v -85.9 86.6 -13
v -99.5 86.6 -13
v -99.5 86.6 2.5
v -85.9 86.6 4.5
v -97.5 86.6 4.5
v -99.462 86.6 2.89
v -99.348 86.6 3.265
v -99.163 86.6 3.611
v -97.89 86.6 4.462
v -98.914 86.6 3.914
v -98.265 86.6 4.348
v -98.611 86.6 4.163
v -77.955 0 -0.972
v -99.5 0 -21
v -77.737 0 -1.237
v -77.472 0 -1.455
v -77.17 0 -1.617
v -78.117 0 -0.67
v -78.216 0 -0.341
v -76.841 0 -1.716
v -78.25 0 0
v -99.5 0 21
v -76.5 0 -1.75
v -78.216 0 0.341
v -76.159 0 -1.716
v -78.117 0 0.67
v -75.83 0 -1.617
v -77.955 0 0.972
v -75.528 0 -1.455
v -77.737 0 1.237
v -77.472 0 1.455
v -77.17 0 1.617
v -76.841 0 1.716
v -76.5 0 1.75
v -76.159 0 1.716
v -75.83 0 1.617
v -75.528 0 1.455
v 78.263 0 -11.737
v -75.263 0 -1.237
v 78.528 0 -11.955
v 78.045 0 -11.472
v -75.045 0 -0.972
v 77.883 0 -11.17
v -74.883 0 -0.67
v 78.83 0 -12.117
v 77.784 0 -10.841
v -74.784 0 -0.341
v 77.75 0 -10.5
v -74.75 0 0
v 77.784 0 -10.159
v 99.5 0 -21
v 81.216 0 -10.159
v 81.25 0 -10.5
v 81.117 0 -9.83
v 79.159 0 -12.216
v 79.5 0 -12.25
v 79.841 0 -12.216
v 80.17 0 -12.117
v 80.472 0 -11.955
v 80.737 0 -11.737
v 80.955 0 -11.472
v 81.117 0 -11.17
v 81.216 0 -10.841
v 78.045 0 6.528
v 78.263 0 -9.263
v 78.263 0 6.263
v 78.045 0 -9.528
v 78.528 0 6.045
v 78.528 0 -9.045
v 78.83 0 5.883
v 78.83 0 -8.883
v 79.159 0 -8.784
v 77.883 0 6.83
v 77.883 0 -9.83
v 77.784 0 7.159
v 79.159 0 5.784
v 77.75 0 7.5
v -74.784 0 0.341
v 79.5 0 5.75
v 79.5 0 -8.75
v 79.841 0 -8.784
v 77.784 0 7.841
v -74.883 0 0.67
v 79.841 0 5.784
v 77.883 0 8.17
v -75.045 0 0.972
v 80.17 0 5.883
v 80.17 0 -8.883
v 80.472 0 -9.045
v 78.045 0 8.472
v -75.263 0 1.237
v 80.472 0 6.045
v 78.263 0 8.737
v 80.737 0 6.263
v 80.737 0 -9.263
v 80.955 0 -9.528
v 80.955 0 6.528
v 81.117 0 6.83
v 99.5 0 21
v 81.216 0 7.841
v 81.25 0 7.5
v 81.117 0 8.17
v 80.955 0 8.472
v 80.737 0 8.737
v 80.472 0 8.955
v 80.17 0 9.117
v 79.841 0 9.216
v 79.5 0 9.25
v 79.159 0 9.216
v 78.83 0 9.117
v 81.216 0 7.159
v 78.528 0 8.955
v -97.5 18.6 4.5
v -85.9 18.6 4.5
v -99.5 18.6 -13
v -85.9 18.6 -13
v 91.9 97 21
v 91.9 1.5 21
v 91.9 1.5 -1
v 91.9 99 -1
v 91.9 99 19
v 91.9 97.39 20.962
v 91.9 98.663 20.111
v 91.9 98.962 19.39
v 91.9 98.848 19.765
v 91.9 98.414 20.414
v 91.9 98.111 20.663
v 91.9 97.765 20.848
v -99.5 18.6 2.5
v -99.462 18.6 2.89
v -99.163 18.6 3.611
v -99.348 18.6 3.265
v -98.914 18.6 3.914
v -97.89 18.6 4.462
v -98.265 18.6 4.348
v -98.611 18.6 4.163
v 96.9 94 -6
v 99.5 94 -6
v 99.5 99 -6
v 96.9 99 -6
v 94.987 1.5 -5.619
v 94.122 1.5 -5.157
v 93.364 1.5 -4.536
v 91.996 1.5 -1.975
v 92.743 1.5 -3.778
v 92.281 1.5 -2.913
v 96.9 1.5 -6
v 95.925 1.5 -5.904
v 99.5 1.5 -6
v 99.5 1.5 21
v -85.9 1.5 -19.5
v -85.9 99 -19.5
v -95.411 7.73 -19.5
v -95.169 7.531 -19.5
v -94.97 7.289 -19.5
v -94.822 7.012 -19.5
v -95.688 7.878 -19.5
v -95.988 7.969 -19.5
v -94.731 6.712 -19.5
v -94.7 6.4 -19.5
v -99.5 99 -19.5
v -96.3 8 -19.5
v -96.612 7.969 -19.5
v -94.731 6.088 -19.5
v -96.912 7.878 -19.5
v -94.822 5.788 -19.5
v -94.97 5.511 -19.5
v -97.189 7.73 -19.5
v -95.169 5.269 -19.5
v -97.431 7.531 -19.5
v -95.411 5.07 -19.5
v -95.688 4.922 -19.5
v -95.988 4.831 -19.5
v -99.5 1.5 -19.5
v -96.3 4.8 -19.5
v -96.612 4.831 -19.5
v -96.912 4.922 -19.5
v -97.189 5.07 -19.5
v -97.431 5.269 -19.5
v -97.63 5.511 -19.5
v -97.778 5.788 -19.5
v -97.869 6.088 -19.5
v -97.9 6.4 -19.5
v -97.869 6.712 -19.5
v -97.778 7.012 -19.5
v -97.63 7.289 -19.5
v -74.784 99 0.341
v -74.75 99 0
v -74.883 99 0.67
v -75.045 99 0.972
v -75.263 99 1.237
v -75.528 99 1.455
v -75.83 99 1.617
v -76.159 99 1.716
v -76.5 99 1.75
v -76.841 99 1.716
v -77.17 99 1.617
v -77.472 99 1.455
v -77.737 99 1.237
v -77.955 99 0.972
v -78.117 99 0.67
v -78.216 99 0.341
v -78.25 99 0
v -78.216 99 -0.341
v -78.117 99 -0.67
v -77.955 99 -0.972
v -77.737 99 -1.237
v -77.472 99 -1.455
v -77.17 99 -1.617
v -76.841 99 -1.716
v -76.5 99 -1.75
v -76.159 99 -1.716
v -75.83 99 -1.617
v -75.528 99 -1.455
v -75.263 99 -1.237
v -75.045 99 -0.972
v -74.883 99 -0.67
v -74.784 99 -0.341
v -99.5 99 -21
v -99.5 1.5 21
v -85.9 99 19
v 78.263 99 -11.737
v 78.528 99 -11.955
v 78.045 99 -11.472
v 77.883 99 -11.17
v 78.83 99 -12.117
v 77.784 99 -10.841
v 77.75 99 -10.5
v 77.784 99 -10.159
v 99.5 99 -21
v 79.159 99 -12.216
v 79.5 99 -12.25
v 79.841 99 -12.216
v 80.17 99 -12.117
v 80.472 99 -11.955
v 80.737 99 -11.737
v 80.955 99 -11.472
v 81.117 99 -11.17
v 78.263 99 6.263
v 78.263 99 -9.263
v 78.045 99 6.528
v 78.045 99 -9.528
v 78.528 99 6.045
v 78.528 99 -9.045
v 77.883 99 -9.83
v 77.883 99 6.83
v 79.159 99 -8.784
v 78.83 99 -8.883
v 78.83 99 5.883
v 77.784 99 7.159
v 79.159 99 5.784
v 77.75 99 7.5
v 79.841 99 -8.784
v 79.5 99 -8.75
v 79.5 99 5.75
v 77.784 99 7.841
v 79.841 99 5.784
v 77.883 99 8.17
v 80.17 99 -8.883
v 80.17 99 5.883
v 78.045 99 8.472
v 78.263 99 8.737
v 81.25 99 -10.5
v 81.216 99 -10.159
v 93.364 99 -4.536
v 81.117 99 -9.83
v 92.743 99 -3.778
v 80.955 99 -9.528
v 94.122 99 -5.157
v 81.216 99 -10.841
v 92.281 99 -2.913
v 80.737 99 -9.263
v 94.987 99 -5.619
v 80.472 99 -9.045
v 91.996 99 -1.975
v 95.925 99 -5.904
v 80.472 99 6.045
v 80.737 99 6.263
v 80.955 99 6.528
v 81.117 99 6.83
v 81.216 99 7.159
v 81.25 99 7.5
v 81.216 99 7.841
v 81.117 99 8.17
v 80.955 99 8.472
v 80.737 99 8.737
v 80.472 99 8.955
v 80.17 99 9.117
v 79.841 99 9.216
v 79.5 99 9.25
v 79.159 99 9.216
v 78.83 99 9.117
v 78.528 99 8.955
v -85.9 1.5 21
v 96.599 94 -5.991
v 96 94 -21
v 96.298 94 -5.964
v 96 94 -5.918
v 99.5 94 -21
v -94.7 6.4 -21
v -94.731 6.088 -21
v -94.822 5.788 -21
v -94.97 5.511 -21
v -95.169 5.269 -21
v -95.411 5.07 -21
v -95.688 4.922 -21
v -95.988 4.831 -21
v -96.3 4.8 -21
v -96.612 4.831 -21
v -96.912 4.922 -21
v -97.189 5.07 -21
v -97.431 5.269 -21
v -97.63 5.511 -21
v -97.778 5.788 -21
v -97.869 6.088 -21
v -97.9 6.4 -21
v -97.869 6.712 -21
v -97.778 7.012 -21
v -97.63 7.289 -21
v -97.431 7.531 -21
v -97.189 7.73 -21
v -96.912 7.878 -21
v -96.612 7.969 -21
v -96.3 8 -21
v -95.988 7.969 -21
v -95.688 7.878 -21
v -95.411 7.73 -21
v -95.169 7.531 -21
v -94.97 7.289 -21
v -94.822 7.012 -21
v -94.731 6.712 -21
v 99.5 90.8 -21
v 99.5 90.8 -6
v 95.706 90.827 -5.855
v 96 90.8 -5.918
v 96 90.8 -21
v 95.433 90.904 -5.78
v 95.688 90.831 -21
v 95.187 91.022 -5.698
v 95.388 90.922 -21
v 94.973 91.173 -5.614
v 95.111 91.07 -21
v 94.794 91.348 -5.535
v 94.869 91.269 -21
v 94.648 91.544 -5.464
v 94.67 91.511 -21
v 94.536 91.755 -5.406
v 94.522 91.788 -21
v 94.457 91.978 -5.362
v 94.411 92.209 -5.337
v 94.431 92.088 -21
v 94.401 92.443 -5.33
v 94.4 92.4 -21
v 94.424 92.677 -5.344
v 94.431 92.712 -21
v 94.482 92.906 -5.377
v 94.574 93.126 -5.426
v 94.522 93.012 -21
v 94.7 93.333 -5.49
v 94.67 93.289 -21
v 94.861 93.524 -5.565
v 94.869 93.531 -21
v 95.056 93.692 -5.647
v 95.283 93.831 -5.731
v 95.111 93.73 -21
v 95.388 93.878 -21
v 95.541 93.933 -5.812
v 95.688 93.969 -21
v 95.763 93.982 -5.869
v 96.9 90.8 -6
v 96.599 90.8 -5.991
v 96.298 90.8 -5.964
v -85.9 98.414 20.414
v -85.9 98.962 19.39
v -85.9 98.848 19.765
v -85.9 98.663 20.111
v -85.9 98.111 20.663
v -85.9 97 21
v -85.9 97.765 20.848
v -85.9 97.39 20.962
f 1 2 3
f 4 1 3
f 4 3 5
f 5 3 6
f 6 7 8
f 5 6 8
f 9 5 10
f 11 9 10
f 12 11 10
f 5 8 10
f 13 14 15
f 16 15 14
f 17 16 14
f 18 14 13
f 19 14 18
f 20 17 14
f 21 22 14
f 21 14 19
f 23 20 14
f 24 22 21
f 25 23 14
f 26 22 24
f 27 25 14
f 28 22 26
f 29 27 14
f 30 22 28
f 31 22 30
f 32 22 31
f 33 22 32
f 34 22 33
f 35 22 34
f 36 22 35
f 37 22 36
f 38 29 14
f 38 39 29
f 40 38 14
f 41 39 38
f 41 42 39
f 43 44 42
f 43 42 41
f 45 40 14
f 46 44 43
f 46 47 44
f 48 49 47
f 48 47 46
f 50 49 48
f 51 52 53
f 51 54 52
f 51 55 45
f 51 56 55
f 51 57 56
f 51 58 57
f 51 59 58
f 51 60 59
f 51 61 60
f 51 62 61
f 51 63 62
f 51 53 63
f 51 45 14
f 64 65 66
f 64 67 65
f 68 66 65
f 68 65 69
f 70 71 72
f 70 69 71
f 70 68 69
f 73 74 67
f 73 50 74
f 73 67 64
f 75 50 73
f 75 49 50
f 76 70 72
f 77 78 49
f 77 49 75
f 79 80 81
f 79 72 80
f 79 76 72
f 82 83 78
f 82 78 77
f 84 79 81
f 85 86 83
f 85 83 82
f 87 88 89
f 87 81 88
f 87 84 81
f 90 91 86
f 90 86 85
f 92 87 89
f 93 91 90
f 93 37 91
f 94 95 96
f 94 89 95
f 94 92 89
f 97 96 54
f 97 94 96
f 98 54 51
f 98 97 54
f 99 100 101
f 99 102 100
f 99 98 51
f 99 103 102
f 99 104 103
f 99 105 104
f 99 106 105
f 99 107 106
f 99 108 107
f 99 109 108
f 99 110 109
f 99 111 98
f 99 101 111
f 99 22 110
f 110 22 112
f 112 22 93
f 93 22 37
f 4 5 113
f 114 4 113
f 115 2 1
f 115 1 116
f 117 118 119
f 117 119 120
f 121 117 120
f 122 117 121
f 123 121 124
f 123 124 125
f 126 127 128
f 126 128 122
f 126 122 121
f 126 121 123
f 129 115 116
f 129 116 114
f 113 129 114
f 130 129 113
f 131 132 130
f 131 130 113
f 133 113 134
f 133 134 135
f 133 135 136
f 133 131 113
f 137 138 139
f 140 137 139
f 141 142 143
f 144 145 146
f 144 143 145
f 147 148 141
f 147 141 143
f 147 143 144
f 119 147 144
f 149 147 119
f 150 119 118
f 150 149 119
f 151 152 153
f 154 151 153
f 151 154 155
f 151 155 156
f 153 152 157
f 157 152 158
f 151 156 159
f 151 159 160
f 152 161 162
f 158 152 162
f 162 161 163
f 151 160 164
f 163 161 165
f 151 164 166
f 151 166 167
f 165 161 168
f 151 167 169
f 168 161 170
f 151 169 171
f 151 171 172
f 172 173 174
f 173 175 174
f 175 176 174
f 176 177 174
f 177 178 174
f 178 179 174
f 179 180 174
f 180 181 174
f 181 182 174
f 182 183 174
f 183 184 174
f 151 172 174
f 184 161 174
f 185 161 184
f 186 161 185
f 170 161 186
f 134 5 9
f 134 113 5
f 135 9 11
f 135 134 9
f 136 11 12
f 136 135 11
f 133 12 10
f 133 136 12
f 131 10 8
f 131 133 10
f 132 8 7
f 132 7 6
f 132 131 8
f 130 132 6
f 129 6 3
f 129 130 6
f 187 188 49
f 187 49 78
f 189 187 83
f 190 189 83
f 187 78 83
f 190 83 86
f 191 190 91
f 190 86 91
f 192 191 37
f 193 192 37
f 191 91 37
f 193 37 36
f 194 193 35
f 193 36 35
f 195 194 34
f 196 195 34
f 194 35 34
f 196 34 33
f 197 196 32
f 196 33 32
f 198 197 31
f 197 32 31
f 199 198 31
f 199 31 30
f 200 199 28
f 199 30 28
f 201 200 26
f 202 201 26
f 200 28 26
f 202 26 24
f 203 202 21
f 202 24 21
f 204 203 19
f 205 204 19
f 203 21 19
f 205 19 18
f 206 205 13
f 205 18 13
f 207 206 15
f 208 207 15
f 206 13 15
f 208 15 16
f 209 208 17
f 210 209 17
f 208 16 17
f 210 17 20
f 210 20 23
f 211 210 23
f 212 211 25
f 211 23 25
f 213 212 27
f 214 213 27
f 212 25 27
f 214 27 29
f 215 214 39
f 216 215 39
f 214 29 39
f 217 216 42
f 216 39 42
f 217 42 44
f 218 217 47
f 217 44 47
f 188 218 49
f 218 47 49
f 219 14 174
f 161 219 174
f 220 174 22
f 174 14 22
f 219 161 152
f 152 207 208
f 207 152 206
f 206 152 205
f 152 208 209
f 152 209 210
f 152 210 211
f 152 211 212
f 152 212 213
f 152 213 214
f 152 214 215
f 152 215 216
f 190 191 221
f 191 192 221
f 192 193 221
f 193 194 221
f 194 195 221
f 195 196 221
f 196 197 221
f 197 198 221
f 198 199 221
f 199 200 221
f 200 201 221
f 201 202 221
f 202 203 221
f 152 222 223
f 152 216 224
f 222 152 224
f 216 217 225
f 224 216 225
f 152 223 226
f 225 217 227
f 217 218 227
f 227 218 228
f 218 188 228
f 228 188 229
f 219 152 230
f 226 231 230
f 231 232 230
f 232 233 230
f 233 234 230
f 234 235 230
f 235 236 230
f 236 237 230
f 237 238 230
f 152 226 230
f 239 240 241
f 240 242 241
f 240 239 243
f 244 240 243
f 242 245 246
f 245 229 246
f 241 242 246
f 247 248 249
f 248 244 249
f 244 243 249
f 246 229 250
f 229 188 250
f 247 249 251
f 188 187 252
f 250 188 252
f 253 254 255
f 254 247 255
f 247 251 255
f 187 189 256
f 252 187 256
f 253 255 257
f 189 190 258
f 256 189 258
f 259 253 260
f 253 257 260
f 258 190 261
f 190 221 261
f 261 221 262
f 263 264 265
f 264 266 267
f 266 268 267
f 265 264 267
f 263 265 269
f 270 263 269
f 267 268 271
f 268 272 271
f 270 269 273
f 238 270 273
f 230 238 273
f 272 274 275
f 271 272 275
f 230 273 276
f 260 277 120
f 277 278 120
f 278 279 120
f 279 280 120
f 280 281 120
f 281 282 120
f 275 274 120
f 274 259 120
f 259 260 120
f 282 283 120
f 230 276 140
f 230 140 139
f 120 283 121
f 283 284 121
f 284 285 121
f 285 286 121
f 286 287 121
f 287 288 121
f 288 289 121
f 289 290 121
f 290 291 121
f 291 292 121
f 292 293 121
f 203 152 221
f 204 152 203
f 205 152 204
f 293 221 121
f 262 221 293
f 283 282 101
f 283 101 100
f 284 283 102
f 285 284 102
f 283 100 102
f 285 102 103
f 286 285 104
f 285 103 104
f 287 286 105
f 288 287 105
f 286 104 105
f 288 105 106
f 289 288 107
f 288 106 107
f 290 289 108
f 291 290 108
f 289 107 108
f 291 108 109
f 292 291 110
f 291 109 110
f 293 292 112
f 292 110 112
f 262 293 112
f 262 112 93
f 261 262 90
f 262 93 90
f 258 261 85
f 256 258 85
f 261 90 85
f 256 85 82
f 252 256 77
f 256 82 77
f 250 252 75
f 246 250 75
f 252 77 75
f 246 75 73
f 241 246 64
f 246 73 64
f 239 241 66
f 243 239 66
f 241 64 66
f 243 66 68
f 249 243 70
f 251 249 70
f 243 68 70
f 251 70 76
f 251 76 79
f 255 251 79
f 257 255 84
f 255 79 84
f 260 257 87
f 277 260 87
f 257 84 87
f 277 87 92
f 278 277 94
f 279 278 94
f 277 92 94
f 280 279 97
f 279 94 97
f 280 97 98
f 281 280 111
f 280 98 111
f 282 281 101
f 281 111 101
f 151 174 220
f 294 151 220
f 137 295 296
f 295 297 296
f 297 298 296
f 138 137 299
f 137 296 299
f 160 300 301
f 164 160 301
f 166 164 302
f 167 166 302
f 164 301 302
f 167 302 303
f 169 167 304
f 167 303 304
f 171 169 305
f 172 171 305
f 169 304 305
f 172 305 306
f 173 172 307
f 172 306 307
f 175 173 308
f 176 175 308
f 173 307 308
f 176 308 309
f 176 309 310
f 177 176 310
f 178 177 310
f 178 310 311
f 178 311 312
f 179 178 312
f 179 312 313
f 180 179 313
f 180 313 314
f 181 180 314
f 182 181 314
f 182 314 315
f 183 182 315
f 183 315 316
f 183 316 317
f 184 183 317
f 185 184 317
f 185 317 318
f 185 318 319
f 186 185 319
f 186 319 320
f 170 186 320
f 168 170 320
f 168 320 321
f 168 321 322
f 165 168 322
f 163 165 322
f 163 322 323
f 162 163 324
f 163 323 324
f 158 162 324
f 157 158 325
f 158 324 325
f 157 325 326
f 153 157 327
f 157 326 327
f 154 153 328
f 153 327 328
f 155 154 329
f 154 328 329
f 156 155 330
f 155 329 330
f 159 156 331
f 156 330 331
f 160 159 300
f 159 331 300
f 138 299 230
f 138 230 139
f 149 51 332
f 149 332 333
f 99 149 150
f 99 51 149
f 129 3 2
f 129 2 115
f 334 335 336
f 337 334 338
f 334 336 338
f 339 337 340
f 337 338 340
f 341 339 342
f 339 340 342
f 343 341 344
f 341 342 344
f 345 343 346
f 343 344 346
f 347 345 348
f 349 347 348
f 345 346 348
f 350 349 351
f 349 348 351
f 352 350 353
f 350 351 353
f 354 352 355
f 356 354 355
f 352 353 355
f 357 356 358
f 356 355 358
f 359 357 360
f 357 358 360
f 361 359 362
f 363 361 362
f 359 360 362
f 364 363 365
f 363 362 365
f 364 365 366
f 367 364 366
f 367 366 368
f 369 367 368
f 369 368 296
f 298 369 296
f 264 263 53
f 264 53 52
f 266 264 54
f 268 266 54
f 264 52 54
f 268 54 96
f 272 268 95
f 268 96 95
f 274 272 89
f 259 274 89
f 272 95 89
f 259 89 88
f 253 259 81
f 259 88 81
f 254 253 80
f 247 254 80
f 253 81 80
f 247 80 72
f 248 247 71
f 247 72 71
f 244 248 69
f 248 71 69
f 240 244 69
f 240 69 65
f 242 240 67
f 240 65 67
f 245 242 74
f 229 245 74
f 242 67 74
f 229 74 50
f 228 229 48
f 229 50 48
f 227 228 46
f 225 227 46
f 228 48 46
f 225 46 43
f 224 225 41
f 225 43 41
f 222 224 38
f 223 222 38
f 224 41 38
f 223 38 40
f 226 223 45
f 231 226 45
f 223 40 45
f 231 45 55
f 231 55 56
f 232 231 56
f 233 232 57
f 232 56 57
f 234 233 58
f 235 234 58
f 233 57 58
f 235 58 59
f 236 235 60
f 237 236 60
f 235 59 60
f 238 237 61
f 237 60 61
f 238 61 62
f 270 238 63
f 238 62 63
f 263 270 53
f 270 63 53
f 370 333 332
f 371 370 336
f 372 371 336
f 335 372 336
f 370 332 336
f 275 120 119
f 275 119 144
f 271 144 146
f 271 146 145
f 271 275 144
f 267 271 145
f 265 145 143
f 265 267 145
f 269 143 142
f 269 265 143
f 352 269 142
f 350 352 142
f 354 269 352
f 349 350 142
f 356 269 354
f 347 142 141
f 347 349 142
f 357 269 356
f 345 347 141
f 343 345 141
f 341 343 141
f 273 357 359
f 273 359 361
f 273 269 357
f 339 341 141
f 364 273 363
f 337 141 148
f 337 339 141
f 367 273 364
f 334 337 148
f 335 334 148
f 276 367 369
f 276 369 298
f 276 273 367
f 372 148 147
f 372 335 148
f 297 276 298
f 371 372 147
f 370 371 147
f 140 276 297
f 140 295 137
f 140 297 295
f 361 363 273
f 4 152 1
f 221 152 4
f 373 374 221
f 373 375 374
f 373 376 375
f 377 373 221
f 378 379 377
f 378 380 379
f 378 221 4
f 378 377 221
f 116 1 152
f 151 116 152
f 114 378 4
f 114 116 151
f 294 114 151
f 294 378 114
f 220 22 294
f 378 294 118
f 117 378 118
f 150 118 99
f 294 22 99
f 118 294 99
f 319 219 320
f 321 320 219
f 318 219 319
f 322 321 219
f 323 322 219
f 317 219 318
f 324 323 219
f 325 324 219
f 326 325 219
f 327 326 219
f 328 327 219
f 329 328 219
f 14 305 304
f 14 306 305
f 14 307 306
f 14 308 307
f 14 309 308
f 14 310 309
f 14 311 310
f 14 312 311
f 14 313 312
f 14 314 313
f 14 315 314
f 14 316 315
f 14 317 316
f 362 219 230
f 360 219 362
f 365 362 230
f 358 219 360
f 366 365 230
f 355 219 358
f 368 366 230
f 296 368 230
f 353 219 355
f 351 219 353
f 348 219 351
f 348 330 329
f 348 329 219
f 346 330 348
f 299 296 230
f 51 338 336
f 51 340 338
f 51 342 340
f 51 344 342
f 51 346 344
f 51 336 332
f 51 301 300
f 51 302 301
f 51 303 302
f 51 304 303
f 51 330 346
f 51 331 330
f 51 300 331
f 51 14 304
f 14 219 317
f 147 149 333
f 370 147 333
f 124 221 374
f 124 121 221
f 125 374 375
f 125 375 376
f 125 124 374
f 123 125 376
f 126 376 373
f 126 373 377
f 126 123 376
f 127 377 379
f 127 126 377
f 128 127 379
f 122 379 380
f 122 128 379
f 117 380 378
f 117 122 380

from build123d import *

# Parameters (mm, degrees)
F1_W      = 199
F1_H      = 42
F1_R      = 1.75
F2_DEPTH  = 99
F4_W      = 97.5
F4_H      = 27
F5_DEPTH  = 7.6
F6_R      = 5
F8_W      = 97.5
F8_H      = 40.5
F9_DEPTH  = 13.6
F10_W     = 68
F10_H     = 17.5
F11_DEPTH = 13.6
F12_R     = 2
F13_R     = 2
F15_R     = 1.6
F16_DEPTH = 42.001


# Not quite as in the source:
# - the program builds the solid bodies; features that only make, move or delete a surface that nothing else refers to are left out


with BuildPart() as f2:
    # F1 (on Front) → F2 (new body)
    with BuildSketch(Plane.XZ):
        Rectangle(F1_W, F1_H)
        with Locations((79.5, -10.5)):
            Circle(F1_R, mode=Mode.SUBTRACT)
        with Locations((-76.5, 0)):
            Circle(F1_R, mode=Mode.SUBTRACT)
        with Locations((79.5, 7.5)):
            Circle(F1_R, mode=Mode.SUBTRACT)
    extrude(amount=-F2_DEPTH)

    # F4 (on offset) → F5 (cut)
    with BuildSketch(Plane.YZ.offset(99.5)):
        with Locations((50.25, 7.5)):
            Rectangle(F4_W, F4_H)
    extrude(amount=-F5_DEPTH, mode=Mode.SUBTRACT)

    # F6
    f6_edges = [f2.edges().sort_by_distance(p)[0] for p in [
        (91.9, 50.25, -6),
    ]]
    fillet(f6_edges, radius=F6_R)

    # F8 (on offset) → F9 (cut)
    with BuildSketch(Plane(origin=(-99.5, 0, 0), x_dir=(0, -1, 0), z_dir=(-1, 0, 0))):
        with Locations((-50.25, 0.75)):
            Rectangle(F8_W, F8_H)
    extrude(amount=-F9_DEPTH, mode=Mode.SUBTRACT)

    # F10 (on offset) → F11 (join, through all)
    with BuildSketch(Plane(origin=(-99.5, 0, 0), x_dir=(0, -1, 0), z_dir=(-1, 0, 0))):
        with Locations((-52.6, -4.25)):
            Rectangle(F10_W, F10_H)
    extrude(amount=-F11_DEPTH)

    # F12
    f12_edges = [f2.edges().sort_by_distance(p)[0] for p in [
        (-99.5, 52.6, 4.5),
    ]]
    fillet(f12_edges, radius=F12_R)

    # F13
    f13_edges = [f2.edges().sort_by_distance(p)[0] for p in [
        (3, 99, 21),
    ]]
    fillet(f13_edges, radius=F13_R)

    # F15 (on face) → F16 (cut, through all)
    with BuildSketch(Plane(origin=(0, 0, -21), x_dir=(1, 0, 0), z_dir=(0, 0, -1))):
        with Locations((-96.3, -6.4)):
            Circle(F15_R)
        with BuildLine():
            Line((96, -94), (99.5, -94))
            Line((99.5, -94), (99.5, -90.8))
            Line((99.5, -90.8), (96, -90.8))
            ThreePointArc((96, -90.8), (97.1313708499, -91.2686291501), (97.6, -92.4))
            ThreePointArc((97.6, -92.4), (97.1313708499, -93.5313708499), (96, -94))
        make_face()
        with BuildLine():
            Line((96, -90.8), (96, -94))
            ThreePointArc((96, -94), (97.1313708499, -93.5313708499), (97.6, -92.4))
            ThreePointArc((97.6, -92.4), (97.1313708499, -91.2686291501), (96, -90.8))
        make_face()
        with BuildLine():
            ThreePointArc((96, -90.8), (94.4, -92.4), (96, -94))
            Line((96, -94), (96, -90.8))
        make_face()
    extrude(amount=-F16_DEPTH, mode=Mode.SUBTRACT)


solid = f2.part
